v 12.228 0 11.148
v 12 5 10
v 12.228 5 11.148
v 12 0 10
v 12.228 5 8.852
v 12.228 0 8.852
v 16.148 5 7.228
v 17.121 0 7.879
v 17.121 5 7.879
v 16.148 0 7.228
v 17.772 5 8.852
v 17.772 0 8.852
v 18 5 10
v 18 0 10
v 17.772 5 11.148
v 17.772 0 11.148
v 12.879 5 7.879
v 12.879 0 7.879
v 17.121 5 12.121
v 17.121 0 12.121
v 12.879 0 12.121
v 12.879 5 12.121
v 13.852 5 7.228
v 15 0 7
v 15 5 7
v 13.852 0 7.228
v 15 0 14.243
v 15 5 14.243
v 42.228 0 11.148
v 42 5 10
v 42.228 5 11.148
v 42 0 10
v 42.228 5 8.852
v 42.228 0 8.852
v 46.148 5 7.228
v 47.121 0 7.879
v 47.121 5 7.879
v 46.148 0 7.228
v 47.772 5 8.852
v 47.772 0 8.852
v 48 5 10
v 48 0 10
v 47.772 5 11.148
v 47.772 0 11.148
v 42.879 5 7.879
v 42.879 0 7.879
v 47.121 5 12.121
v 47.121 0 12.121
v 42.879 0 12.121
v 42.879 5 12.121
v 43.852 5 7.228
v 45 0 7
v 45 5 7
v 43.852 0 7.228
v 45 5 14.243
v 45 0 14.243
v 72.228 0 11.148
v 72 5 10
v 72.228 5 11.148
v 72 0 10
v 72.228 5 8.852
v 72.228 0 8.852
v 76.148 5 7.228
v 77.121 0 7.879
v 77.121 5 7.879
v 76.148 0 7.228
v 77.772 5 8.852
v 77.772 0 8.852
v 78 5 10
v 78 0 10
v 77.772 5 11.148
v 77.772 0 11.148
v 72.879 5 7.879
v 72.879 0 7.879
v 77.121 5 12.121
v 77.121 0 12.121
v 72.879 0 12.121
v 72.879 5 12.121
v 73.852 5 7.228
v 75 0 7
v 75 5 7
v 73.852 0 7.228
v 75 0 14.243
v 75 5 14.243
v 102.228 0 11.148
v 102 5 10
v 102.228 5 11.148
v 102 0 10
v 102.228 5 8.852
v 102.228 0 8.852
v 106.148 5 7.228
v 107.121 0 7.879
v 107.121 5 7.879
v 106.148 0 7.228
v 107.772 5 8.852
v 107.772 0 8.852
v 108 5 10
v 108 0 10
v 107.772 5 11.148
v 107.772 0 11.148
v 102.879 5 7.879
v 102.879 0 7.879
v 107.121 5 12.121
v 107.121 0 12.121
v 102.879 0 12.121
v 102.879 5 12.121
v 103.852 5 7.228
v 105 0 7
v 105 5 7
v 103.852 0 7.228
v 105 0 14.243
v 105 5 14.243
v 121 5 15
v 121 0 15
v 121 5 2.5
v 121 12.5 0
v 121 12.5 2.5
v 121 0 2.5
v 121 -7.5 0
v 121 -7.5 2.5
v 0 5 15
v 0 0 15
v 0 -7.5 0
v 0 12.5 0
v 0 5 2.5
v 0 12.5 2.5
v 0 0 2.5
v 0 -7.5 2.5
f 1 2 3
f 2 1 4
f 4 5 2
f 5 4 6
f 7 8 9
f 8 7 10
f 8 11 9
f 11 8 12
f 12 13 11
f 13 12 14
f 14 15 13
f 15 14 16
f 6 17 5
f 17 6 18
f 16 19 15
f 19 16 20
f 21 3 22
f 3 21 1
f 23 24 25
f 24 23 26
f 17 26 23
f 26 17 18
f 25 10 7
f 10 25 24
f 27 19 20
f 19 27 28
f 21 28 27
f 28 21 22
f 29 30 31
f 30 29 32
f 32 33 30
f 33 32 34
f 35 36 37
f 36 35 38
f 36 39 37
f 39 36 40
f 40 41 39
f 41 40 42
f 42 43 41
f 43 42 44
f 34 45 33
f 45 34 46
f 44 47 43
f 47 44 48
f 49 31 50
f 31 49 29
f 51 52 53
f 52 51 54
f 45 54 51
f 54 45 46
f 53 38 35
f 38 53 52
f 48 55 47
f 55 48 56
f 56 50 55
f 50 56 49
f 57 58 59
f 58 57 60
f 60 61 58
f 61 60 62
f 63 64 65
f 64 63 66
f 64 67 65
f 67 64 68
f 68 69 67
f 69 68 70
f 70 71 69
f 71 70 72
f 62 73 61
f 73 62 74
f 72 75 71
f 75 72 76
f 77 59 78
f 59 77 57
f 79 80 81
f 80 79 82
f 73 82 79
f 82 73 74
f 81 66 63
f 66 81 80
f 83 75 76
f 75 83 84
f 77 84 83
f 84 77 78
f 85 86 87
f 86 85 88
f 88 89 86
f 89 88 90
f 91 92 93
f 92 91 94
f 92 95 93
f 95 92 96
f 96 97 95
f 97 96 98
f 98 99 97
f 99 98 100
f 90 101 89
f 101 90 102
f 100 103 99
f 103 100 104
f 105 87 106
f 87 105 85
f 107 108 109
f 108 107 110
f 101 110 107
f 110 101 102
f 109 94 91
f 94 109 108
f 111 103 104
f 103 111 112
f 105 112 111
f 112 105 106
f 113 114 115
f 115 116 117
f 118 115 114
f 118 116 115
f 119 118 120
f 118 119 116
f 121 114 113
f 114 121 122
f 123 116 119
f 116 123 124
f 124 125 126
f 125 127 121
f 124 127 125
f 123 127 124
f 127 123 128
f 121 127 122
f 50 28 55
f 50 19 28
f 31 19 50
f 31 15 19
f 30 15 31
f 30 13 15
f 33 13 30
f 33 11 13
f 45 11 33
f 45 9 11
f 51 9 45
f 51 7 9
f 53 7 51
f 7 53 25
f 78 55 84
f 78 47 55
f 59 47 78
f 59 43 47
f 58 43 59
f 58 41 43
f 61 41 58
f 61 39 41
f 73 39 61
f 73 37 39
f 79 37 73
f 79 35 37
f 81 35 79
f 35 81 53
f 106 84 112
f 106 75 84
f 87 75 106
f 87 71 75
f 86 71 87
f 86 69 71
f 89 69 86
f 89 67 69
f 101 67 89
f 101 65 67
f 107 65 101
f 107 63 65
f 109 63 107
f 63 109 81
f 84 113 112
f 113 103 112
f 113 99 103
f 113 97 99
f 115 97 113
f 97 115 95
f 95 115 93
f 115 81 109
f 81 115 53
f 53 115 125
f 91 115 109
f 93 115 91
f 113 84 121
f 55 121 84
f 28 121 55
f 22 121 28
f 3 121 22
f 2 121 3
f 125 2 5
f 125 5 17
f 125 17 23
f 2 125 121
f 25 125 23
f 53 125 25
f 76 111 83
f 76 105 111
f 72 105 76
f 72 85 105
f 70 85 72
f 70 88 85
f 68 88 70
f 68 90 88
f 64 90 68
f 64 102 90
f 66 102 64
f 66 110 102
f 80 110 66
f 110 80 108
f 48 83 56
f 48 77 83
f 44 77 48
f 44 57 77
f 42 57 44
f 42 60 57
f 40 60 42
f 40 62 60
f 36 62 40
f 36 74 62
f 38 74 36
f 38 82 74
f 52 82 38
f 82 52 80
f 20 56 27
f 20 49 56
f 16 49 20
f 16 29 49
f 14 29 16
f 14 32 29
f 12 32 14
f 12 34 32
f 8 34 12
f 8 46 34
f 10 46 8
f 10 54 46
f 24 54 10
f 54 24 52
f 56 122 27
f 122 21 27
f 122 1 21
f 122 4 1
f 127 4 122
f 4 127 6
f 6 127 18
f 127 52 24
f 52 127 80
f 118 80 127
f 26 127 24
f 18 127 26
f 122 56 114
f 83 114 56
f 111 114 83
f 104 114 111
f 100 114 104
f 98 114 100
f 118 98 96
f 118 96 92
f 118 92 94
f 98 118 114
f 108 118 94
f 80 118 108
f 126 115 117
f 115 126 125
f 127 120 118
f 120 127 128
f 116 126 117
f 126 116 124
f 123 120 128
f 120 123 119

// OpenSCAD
$fn=16;
holes = 4;
hole_size = 6;
hole_distance = 30;

thickness = 5;
depth = 15;

socket_thickness =20;
styled = "off"; // ["on", "off"]


module cylinder3d(h, d, center){
    rotate([0,0,45]){
    cylinder(h=h,d=d, center=center);
    translate([d/4, d/4,0])
        cube([d/2,d/2, h ], center=center);
    }
}

intersection(){

    difference(){

        cube([1+(holes)*hole_distance, thickness, depth]);
        //holes
        translate([hole_distance/2, 0,depth*2/3]){
            rotate([90,0,0])
            for(x=[0:holes-1]){
                translate([x*hole_distance,0,0])
                cylinder3d(h=thickness*3,d=hole_size, center=true);
            }
            
        }

    }
    if(styled=="on"){
    //style cureves
        translate([hole_distance/2, 0,depth/2]){
            rotate([90,0,0])
            for(x=[0:holes-1]){
                translate([x*hole_distance,0,0])
                scale([2,1,1])
                %cylinder(h=thickness*3,d=20, center=true);
            }
            
        }
    }
}
translate([0,(-socket_thickness+thickness)/2, 0])
cube([1+(holes)*hole_distance, socket_thickness, thickness/2 ]);
